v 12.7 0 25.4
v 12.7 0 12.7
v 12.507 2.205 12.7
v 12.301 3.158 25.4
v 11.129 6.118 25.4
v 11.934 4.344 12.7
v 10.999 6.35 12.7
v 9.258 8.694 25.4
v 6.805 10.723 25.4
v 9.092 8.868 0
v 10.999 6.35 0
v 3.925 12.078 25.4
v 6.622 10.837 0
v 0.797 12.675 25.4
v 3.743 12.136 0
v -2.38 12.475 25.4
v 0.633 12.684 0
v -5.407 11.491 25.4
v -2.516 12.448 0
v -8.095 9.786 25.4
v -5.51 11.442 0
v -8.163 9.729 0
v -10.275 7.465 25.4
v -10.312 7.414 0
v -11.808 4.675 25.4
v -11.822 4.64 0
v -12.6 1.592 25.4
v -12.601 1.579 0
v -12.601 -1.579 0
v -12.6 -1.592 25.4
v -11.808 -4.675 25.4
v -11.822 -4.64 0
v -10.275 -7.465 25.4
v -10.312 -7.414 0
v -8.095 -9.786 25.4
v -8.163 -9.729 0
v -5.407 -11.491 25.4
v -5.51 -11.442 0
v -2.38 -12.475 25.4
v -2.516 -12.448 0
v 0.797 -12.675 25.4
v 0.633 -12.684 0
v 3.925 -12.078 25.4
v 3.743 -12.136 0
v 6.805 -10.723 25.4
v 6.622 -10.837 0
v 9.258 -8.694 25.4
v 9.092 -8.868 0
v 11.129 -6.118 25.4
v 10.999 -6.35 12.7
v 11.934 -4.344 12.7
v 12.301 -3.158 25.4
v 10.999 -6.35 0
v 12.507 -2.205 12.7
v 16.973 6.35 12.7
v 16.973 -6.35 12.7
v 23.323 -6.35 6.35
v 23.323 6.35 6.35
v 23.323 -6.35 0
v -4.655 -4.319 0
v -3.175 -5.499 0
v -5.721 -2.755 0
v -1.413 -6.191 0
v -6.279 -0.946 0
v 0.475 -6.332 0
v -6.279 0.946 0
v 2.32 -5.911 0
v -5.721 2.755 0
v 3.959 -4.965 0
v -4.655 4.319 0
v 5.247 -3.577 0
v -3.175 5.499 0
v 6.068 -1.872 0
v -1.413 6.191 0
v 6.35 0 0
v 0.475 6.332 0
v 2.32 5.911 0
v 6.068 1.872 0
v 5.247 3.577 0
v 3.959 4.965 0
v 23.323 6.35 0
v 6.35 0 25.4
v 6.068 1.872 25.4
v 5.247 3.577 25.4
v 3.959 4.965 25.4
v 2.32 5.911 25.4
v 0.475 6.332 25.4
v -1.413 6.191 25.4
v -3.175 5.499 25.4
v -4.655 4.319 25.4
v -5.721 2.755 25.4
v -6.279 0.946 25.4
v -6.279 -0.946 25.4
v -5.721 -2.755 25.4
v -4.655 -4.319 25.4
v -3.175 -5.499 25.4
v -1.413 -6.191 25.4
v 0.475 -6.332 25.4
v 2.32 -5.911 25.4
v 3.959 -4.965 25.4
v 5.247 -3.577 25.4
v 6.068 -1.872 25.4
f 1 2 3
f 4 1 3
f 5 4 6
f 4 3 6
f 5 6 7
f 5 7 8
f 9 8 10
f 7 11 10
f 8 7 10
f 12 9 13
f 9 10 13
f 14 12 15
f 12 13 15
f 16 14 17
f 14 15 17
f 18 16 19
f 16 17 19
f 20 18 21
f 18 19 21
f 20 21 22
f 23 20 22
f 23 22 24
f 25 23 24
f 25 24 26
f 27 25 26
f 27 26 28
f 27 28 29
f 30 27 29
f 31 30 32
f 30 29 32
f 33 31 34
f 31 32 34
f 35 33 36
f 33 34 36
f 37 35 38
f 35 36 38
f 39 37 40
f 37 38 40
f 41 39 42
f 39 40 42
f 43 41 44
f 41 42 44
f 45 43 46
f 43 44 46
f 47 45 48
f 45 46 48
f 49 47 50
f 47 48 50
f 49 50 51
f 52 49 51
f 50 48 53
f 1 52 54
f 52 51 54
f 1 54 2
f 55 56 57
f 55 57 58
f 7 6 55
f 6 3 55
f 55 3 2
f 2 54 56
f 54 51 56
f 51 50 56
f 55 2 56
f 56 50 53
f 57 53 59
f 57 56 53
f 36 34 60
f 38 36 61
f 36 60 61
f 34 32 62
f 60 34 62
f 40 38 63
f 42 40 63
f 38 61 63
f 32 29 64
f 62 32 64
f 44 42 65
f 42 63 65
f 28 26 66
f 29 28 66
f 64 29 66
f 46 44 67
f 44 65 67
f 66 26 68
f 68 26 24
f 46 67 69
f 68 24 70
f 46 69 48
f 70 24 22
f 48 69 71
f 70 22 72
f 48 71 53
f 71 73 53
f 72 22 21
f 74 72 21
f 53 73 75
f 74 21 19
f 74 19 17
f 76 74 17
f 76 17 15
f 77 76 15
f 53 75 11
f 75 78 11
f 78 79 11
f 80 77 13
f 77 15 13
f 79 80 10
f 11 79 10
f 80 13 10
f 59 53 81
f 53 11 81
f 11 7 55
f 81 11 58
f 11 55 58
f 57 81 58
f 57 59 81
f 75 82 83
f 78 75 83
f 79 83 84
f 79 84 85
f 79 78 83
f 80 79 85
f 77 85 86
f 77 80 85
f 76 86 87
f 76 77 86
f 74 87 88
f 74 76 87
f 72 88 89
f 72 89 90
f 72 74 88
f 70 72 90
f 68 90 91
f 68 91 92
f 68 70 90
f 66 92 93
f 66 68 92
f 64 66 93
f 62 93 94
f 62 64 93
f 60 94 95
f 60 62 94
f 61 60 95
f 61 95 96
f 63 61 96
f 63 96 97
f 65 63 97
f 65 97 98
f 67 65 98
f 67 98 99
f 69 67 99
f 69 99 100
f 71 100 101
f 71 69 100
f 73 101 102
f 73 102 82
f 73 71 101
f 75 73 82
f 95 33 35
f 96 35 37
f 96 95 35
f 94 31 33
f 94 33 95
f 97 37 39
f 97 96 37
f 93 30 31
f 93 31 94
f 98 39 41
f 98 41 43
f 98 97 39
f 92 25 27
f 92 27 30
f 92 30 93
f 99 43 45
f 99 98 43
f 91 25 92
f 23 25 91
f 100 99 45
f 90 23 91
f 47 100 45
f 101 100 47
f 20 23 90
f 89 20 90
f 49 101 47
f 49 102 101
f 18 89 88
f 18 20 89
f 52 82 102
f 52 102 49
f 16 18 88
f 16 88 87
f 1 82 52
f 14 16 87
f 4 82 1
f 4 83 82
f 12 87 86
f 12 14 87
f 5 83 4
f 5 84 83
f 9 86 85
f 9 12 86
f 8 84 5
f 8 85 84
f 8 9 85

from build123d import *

# Parameters (mm, degrees)
F0_R     = 12.7
F0_R_2   = 6.35
F1_DEPTH = 25.4
F2_W     = 12.7
F2_H     = 12.7
F3_DEPTH = 6.35
F4_SIZE  = 6.35


with BuildPart() as f1:
    # F0 (on Top) → F1 (new body)
    with BuildSketch(Plane.XY):
        Circle(F0_R)
        Circle(F0_R_2, mode=Mode.SUBTRACT)
    extrude(amount=F1_DEPTH)

    # F2 (on Front) → F3 (join, symmetric)
    with BuildSketch(Plane.XZ):
        with Locations((16.972898, 6.35)):
            Rectangle(F2_W, F2_H)
    extrude(amount=F3_DEPTH, both=True)

    # F4
    f4_edges = [f1.edges().sort_by_distance(p)[0] for p in [
        (23.322898, 0, 12.7),
    ]]
    chamfer(f4_edges, length=F4_SIZE)


solid = f1.part
